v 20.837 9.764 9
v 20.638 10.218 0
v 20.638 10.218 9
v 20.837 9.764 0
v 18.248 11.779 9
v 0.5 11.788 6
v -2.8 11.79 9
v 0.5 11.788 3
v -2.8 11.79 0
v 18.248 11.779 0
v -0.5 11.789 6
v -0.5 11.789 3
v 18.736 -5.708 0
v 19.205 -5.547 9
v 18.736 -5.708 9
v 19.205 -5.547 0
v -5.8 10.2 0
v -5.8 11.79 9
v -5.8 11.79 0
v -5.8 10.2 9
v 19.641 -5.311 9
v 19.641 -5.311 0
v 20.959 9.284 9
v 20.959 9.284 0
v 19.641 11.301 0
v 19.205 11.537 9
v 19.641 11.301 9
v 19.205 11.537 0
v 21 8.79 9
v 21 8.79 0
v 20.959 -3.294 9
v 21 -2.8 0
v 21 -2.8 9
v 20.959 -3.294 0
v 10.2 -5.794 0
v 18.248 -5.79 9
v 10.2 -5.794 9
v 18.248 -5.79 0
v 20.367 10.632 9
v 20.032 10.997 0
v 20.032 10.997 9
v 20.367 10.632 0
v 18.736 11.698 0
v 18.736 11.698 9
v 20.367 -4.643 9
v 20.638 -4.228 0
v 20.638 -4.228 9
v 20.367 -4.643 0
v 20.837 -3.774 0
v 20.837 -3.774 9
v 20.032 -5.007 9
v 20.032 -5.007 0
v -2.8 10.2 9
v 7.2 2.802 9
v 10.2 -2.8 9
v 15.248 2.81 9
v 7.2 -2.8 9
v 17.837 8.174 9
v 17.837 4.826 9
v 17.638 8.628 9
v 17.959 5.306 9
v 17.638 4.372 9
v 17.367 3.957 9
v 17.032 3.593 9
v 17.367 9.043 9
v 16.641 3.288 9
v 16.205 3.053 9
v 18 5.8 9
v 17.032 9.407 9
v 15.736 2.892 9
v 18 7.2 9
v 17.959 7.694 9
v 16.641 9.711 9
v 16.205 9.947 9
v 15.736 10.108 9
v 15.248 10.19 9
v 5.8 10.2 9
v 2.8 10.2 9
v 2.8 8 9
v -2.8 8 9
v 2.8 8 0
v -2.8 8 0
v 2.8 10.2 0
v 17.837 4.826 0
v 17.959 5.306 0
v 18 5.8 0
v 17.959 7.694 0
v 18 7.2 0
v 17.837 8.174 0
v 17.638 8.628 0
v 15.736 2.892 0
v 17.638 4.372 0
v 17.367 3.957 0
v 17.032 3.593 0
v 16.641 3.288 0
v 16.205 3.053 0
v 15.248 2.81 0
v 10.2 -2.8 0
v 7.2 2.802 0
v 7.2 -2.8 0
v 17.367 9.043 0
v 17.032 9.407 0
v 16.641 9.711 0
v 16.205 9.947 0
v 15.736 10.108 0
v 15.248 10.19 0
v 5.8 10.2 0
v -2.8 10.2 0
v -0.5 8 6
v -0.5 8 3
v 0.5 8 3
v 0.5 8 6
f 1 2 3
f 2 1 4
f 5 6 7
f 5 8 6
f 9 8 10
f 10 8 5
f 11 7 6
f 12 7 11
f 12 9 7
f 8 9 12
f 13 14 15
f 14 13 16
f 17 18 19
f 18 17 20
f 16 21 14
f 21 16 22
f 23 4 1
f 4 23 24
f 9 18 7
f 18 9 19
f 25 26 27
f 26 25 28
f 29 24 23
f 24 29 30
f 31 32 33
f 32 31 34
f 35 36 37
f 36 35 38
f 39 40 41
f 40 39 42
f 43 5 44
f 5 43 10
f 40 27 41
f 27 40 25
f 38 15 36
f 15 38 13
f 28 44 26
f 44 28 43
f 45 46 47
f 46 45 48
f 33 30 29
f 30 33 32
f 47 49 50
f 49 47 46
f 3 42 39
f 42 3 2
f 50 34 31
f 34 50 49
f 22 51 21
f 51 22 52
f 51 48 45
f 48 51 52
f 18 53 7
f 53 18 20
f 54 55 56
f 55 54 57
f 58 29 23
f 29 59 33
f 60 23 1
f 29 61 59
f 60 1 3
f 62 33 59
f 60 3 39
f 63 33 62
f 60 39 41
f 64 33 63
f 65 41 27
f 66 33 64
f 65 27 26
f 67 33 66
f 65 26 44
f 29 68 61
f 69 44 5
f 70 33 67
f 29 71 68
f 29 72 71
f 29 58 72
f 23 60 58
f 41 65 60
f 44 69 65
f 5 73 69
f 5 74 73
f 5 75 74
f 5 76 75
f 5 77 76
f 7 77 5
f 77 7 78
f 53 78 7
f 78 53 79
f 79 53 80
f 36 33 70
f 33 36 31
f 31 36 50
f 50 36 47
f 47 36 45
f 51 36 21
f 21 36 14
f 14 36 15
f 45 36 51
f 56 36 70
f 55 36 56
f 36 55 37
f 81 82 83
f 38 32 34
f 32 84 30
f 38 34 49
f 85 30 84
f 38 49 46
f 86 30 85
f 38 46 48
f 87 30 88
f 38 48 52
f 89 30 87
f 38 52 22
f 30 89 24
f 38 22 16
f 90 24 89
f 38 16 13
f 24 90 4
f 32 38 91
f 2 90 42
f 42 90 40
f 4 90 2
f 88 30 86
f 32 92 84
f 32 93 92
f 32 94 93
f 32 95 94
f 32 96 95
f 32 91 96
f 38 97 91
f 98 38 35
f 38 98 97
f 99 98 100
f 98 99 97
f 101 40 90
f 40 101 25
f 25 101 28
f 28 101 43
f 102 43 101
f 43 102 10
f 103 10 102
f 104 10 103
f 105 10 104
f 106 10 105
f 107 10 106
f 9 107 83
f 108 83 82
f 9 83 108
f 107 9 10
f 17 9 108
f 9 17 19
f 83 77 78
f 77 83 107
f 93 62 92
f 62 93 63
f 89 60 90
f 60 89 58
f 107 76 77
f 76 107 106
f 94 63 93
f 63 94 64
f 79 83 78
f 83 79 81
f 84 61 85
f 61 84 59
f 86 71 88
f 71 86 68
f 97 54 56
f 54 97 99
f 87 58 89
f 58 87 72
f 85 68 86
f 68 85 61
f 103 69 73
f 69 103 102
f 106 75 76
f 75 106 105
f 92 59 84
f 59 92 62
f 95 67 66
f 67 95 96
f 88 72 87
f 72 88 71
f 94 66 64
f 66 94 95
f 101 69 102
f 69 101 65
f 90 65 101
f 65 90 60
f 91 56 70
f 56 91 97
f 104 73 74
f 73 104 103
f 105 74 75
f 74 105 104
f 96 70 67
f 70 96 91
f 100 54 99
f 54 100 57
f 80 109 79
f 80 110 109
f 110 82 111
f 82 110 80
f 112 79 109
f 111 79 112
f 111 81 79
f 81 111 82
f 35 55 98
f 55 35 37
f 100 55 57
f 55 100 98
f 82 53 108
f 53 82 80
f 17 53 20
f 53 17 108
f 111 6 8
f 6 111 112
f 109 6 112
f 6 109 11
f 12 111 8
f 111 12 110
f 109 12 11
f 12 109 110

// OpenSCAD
// file: functions.scad
/*******************************************************************

This OpenSCAD code and its rendered 3D model are part of the

	Kühling&Kühling RepRap Industrial 3D Printer


All details, BOM, assembling instructions and latest sources:
	http://kuehlingkuehling.de

Designed and developed by:
	Jonas Kühling <mail@jonaskuehling.de>
	Simon Kühling <mail@simonkuehling.de>

Licensed under:
	Creative Commons Attribution-ShareAlike
	CC BY-SA 3.0
	http://creativecommons.org/licenses/by-sa/3.0/

*******************************************************************/

module teardrop (r=4.5,h=20,alpha=45,teardropcorner=0,fulldrop=0){		// tear drop hole for top-centering
											// use teardropcorner=1 for bottom horizontal corners
	render()
	translate([-h/2,0,0])
		rotate([-270,0+(teardropcorner*180),90])
			difference(){
				linear_extrude(height=h){
					circle(r);
					polygon(points=[[0,0],[r*cos(alpha),r*sin(alpha)],[0,r/sin(alpha)],[-r*cos(alpha),r*sin(alpha)]], paths=[[0,1,2,3]]);
				}
				if(fulldrop==0) 
					translate([0,(r/sin(alpha))/2+r,h/2]) cube([2*r+2,r/sin(alpha),h+2],center=true);
			}
}

//teardrop(4.5,22,fulldrop=true);



module teardropcentering (r=4.5,h=20,alpha=45){				// tear drop hole for top-centering
	centering_offset_factor = 1.1;
	render()
	translate([-h/2,0,0])
		rotate([-270,0,90])
			difference(){
				linear_extrude(height=h){
					circle(r, $fn=24);
					polygon(points=[[0,0],[r*cos(alpha),r*sin(alpha)],[0,r/sin(alpha)],[-r*cos(alpha),r*sin(alpha)]], paths=[[0,1,2,3]]);
				}
				translate([0,(r/sin(alpha))/2+r*centering_offset_factor,h/2]) cube([2*r+2,r/sin(alpha),h+2],center=true);
			}
}

//teardropcentering();



module teardropcentering_half (r=4.5,h=20, bottom=0,alpha=45){				// tear drop hole for top-centering
																// upper half (bottom=0) or bottom half (bottom=1)
	centering_offset_factor = 1.2;
	render()
	translate([-h/2,0,0])
		rotate([-270,0,90])
			difference(){
				linear_extrude(height=h){
					circle(r, $fn=24);
					polygon(points=[[0,0],[r*cos(alpha),r*sin(alpha)],[0,r/sin(alpha)],[-r*cos(alpha),r*sin(alpha)]], paths=[[0,1,2,3]]);
				}
				translate([0,(r/sin(alpha))/2+r*centering_offset_factor,h/2]) cube([2*r+2,r/sin(alpha),h+2],center=true);
				translate([0,-(r*centering_offset_factor)/2-0.5+bottom*(r*centering_offset_factor+1),h/2]) cube([2*r+2,r*centering_offset_factor+1,h+2],center=true);
			}
}

//teardropcentering_half(bottom=0);


module polyhole(d,h){
	n = max(round(2 * d),3);
	cylinder(h = h, r = (d / 2) / cos (180 / n), $fn = n, center=true);
}



module roundcorner(radius,edge_length){
	render()
	translate([0,0,-1])
		difference(){
			translate([-1,-1,0])
				cube(size = [radius+1,radius+1,edge_length+2], center = false);
			translate(v = [radius,radius,-1])
				cylinder(h = edge_length+4, r=radius, center=false,$fs=0.1);
		}
}

//roundcorner(5,5);



module roundcorner_tear(radius,edge_length){
	render()
	difference(){
		translate([-1,-1,-1])
			cube(size = [edge_length+2, radius+1, radius+1], center = false);
		translate([(edge_length+4)/2-2, radius, radius])
			teardrop(radius, edge_length+4,teardropcorner=1);
	}
}

//roundcorner_tear(8,20);


module roundedge_tear(radius){
	render()
	difference(){
		translate([-1,-1,-1])
			cube(size = [radius+1, radius+1, radius+1], center = false);
		translate([radius,radius,radius])
			union(){
				sphere(r=radius, $fs=0.1);
				translate([0,0,-radius])
					cylinder(r1=(radius*sin(45))-(radius-(radius*sin(45))),r2=radius*sin(45),h=(radius-(radius*sin(45))), $fs=0.1);
			}
	}
}

//roundedge_tear(20);



module roundedge(radius){
	render()
	difference(){
		translate([-1,-1,-1])
			cube(size = [radius+1, radius+1, radius+1], center = false);
		translate([radius,radius,radius])
			sphere(r=radius, $fs=0.1);
	}
}

//roundedge(5);


module nut_trap(nut_wrench_size,trap_height,vertical=0, clearance=0.2,center=true){		// M3 wrench size = 5.5
	radius = cornerdiameter(nut_wrench_size+2*clearance) /2;
	rotate([0,vertical*90,0])
		cylinder(h = trap_height, r = radius, center=center, $fn = 6);
}

//nut_trap(5,5,0);

module nut_slot(nut_wrench_size,nut_height, nut_elevation,vertical=0, clearance=0.2){		// M3 wrench size = 5.5
	radius = cornerdiameter(nut_wrench_size+2*clearance) /2;
	slot_height = nut_height+2*clearance;
	slot_width = nut_wrench_size+2*clearance;
	rotate([0,vertical*270,0]){
		cylinder(h = slot_height, r = radius, center=true, $fn = 6);
		translate([0,-slot_width/2,-slot_height/2]) cube([nut_elevation+1,slot_width,slot_height]);
	}
}

//nut_slot(5.5,3,4,1);

function cornerdiameter(wrench_size) =  2* ((wrench_size)/2)/ cos(180/6);
function cornerdiameter_8(wrench_size) =  2* ((wrench_size)/2)/ cos(180/8);
// main file
/*******************************************************************

This OpenSCAD code and its rendered 3D model are part of the

	Kühling&Kühling RepRap Industrial 3D Printer


All details, BOM, assembling instructions and latest sources:
	http://kuehlingkuehling.de

Designed and developed by:
	Jonas Kühling <mail@jonaskuehling.de>
	Simon Kühling <mail@simonkuehling.de>

Licensed under:
	Creative Commons Attribution-ShareAlike
	CC BY-SA 3.0
	http://creativecommons.org/licenses/by-sa/3.0/

*******************************************************************/

include <configuration.scad>


frame_cable_clip_width = 3*wall;
frame_cable_clip_flexfactor = 2 / (6-wall + frame_width/2-frame_groove_width/2+2*clearance);


// RENDER
frame_cable_clip(frame_cable_clip_size = 8);
//frame_cable_clip(frame_cable_clip_size = 17);
//frame_cable_clip(frame_cable_clip_size = 30);



module frame_cable_clip(frame_cable_clip_size = 6){

	frame_cable_clip_size = max(2*wall, frame_cable_clip_size);
	top_flex_thickness = (2/3) * min(2*wall,(2+ ((frame_cable_clip_size-6) * frame_cable_clip_flexfactor)));

	difference(){

		// main body
		hull(){
			translate([frame_width/2+frame_cable_clip_size+wall-wall,frame_width/2+clearance+top_flex_thickness-wall,0])
				cylinder(r=wall,h=frame_cable_clip_width);
			translate([frame_width/2+frame_cable_clip_size+wall-wall,-frame_width/2+frame_enclosure_thickness+clearance+wall,0])
				cylinder(r=wall,h=frame_cable_clip_width);
			translate([-frame_width/2+frame_enclosure_thickness+clearance,-frame_width/2+frame_enclosure_thickness+clearance,0])
				cube([wall,top_flex_thickness+clearance+frame_width-frame_enclosure_thickness-clearance,frame_cable_clip_width]);
		}

		// cable clearance
		hull(){
			translate([frame_width/2+frame_cable_clip_size+wall-wall-wall,frame_width/2+clearance+wall-wall-wall,-1])
				cylinder(r=wall,h=frame_cable_clip_width+2);
			translate([frame_width/2+frame_cable_clip_size+wall-wall-wall,+frame_groove_width/2-clearance+wall,-1])
				cylinder(r=wall,h=frame_cable_clip_width+2);
			translate([frame_groove_width/2-clearance,frame_groove_width/2-clearance,-1])
				cube([wall,clearance+frame_width/2-frame_groove_width/2+clearance,frame_cable_clip_width+2]);
		}

		// frame clearance
		translate([-(frame_width-2*wall+2*clearance)/2,-(frame_width-4*wall_thin)/2,-1])
			cube([frame_width-2*wall+2*clearance,frame_width-4*wall_thin,frame_cable_clip_width+2]);
		translate([0,-(frame_width/2-frame_groove_width/2+clearance)-frame_groove_width/2+clearance,-1])
			cube([frame_width/2+clearance,frame_width/2-frame_groove_width/2+clearance,frame_cable_clip_width+2]);
		translate([-frame_width/2-frame_groove_width/2+clearance,0,-1])
			cube([frame_width/2,frame_width/2+clearance,frame_cable_clip_width+2]);

		// screw driver clip release hole
		translate([-wall_thin/2,0,-wall/2+frame_cable_clip_width/2])
			cube([wall_thin,frame_width,wall]);
			
	}
}
